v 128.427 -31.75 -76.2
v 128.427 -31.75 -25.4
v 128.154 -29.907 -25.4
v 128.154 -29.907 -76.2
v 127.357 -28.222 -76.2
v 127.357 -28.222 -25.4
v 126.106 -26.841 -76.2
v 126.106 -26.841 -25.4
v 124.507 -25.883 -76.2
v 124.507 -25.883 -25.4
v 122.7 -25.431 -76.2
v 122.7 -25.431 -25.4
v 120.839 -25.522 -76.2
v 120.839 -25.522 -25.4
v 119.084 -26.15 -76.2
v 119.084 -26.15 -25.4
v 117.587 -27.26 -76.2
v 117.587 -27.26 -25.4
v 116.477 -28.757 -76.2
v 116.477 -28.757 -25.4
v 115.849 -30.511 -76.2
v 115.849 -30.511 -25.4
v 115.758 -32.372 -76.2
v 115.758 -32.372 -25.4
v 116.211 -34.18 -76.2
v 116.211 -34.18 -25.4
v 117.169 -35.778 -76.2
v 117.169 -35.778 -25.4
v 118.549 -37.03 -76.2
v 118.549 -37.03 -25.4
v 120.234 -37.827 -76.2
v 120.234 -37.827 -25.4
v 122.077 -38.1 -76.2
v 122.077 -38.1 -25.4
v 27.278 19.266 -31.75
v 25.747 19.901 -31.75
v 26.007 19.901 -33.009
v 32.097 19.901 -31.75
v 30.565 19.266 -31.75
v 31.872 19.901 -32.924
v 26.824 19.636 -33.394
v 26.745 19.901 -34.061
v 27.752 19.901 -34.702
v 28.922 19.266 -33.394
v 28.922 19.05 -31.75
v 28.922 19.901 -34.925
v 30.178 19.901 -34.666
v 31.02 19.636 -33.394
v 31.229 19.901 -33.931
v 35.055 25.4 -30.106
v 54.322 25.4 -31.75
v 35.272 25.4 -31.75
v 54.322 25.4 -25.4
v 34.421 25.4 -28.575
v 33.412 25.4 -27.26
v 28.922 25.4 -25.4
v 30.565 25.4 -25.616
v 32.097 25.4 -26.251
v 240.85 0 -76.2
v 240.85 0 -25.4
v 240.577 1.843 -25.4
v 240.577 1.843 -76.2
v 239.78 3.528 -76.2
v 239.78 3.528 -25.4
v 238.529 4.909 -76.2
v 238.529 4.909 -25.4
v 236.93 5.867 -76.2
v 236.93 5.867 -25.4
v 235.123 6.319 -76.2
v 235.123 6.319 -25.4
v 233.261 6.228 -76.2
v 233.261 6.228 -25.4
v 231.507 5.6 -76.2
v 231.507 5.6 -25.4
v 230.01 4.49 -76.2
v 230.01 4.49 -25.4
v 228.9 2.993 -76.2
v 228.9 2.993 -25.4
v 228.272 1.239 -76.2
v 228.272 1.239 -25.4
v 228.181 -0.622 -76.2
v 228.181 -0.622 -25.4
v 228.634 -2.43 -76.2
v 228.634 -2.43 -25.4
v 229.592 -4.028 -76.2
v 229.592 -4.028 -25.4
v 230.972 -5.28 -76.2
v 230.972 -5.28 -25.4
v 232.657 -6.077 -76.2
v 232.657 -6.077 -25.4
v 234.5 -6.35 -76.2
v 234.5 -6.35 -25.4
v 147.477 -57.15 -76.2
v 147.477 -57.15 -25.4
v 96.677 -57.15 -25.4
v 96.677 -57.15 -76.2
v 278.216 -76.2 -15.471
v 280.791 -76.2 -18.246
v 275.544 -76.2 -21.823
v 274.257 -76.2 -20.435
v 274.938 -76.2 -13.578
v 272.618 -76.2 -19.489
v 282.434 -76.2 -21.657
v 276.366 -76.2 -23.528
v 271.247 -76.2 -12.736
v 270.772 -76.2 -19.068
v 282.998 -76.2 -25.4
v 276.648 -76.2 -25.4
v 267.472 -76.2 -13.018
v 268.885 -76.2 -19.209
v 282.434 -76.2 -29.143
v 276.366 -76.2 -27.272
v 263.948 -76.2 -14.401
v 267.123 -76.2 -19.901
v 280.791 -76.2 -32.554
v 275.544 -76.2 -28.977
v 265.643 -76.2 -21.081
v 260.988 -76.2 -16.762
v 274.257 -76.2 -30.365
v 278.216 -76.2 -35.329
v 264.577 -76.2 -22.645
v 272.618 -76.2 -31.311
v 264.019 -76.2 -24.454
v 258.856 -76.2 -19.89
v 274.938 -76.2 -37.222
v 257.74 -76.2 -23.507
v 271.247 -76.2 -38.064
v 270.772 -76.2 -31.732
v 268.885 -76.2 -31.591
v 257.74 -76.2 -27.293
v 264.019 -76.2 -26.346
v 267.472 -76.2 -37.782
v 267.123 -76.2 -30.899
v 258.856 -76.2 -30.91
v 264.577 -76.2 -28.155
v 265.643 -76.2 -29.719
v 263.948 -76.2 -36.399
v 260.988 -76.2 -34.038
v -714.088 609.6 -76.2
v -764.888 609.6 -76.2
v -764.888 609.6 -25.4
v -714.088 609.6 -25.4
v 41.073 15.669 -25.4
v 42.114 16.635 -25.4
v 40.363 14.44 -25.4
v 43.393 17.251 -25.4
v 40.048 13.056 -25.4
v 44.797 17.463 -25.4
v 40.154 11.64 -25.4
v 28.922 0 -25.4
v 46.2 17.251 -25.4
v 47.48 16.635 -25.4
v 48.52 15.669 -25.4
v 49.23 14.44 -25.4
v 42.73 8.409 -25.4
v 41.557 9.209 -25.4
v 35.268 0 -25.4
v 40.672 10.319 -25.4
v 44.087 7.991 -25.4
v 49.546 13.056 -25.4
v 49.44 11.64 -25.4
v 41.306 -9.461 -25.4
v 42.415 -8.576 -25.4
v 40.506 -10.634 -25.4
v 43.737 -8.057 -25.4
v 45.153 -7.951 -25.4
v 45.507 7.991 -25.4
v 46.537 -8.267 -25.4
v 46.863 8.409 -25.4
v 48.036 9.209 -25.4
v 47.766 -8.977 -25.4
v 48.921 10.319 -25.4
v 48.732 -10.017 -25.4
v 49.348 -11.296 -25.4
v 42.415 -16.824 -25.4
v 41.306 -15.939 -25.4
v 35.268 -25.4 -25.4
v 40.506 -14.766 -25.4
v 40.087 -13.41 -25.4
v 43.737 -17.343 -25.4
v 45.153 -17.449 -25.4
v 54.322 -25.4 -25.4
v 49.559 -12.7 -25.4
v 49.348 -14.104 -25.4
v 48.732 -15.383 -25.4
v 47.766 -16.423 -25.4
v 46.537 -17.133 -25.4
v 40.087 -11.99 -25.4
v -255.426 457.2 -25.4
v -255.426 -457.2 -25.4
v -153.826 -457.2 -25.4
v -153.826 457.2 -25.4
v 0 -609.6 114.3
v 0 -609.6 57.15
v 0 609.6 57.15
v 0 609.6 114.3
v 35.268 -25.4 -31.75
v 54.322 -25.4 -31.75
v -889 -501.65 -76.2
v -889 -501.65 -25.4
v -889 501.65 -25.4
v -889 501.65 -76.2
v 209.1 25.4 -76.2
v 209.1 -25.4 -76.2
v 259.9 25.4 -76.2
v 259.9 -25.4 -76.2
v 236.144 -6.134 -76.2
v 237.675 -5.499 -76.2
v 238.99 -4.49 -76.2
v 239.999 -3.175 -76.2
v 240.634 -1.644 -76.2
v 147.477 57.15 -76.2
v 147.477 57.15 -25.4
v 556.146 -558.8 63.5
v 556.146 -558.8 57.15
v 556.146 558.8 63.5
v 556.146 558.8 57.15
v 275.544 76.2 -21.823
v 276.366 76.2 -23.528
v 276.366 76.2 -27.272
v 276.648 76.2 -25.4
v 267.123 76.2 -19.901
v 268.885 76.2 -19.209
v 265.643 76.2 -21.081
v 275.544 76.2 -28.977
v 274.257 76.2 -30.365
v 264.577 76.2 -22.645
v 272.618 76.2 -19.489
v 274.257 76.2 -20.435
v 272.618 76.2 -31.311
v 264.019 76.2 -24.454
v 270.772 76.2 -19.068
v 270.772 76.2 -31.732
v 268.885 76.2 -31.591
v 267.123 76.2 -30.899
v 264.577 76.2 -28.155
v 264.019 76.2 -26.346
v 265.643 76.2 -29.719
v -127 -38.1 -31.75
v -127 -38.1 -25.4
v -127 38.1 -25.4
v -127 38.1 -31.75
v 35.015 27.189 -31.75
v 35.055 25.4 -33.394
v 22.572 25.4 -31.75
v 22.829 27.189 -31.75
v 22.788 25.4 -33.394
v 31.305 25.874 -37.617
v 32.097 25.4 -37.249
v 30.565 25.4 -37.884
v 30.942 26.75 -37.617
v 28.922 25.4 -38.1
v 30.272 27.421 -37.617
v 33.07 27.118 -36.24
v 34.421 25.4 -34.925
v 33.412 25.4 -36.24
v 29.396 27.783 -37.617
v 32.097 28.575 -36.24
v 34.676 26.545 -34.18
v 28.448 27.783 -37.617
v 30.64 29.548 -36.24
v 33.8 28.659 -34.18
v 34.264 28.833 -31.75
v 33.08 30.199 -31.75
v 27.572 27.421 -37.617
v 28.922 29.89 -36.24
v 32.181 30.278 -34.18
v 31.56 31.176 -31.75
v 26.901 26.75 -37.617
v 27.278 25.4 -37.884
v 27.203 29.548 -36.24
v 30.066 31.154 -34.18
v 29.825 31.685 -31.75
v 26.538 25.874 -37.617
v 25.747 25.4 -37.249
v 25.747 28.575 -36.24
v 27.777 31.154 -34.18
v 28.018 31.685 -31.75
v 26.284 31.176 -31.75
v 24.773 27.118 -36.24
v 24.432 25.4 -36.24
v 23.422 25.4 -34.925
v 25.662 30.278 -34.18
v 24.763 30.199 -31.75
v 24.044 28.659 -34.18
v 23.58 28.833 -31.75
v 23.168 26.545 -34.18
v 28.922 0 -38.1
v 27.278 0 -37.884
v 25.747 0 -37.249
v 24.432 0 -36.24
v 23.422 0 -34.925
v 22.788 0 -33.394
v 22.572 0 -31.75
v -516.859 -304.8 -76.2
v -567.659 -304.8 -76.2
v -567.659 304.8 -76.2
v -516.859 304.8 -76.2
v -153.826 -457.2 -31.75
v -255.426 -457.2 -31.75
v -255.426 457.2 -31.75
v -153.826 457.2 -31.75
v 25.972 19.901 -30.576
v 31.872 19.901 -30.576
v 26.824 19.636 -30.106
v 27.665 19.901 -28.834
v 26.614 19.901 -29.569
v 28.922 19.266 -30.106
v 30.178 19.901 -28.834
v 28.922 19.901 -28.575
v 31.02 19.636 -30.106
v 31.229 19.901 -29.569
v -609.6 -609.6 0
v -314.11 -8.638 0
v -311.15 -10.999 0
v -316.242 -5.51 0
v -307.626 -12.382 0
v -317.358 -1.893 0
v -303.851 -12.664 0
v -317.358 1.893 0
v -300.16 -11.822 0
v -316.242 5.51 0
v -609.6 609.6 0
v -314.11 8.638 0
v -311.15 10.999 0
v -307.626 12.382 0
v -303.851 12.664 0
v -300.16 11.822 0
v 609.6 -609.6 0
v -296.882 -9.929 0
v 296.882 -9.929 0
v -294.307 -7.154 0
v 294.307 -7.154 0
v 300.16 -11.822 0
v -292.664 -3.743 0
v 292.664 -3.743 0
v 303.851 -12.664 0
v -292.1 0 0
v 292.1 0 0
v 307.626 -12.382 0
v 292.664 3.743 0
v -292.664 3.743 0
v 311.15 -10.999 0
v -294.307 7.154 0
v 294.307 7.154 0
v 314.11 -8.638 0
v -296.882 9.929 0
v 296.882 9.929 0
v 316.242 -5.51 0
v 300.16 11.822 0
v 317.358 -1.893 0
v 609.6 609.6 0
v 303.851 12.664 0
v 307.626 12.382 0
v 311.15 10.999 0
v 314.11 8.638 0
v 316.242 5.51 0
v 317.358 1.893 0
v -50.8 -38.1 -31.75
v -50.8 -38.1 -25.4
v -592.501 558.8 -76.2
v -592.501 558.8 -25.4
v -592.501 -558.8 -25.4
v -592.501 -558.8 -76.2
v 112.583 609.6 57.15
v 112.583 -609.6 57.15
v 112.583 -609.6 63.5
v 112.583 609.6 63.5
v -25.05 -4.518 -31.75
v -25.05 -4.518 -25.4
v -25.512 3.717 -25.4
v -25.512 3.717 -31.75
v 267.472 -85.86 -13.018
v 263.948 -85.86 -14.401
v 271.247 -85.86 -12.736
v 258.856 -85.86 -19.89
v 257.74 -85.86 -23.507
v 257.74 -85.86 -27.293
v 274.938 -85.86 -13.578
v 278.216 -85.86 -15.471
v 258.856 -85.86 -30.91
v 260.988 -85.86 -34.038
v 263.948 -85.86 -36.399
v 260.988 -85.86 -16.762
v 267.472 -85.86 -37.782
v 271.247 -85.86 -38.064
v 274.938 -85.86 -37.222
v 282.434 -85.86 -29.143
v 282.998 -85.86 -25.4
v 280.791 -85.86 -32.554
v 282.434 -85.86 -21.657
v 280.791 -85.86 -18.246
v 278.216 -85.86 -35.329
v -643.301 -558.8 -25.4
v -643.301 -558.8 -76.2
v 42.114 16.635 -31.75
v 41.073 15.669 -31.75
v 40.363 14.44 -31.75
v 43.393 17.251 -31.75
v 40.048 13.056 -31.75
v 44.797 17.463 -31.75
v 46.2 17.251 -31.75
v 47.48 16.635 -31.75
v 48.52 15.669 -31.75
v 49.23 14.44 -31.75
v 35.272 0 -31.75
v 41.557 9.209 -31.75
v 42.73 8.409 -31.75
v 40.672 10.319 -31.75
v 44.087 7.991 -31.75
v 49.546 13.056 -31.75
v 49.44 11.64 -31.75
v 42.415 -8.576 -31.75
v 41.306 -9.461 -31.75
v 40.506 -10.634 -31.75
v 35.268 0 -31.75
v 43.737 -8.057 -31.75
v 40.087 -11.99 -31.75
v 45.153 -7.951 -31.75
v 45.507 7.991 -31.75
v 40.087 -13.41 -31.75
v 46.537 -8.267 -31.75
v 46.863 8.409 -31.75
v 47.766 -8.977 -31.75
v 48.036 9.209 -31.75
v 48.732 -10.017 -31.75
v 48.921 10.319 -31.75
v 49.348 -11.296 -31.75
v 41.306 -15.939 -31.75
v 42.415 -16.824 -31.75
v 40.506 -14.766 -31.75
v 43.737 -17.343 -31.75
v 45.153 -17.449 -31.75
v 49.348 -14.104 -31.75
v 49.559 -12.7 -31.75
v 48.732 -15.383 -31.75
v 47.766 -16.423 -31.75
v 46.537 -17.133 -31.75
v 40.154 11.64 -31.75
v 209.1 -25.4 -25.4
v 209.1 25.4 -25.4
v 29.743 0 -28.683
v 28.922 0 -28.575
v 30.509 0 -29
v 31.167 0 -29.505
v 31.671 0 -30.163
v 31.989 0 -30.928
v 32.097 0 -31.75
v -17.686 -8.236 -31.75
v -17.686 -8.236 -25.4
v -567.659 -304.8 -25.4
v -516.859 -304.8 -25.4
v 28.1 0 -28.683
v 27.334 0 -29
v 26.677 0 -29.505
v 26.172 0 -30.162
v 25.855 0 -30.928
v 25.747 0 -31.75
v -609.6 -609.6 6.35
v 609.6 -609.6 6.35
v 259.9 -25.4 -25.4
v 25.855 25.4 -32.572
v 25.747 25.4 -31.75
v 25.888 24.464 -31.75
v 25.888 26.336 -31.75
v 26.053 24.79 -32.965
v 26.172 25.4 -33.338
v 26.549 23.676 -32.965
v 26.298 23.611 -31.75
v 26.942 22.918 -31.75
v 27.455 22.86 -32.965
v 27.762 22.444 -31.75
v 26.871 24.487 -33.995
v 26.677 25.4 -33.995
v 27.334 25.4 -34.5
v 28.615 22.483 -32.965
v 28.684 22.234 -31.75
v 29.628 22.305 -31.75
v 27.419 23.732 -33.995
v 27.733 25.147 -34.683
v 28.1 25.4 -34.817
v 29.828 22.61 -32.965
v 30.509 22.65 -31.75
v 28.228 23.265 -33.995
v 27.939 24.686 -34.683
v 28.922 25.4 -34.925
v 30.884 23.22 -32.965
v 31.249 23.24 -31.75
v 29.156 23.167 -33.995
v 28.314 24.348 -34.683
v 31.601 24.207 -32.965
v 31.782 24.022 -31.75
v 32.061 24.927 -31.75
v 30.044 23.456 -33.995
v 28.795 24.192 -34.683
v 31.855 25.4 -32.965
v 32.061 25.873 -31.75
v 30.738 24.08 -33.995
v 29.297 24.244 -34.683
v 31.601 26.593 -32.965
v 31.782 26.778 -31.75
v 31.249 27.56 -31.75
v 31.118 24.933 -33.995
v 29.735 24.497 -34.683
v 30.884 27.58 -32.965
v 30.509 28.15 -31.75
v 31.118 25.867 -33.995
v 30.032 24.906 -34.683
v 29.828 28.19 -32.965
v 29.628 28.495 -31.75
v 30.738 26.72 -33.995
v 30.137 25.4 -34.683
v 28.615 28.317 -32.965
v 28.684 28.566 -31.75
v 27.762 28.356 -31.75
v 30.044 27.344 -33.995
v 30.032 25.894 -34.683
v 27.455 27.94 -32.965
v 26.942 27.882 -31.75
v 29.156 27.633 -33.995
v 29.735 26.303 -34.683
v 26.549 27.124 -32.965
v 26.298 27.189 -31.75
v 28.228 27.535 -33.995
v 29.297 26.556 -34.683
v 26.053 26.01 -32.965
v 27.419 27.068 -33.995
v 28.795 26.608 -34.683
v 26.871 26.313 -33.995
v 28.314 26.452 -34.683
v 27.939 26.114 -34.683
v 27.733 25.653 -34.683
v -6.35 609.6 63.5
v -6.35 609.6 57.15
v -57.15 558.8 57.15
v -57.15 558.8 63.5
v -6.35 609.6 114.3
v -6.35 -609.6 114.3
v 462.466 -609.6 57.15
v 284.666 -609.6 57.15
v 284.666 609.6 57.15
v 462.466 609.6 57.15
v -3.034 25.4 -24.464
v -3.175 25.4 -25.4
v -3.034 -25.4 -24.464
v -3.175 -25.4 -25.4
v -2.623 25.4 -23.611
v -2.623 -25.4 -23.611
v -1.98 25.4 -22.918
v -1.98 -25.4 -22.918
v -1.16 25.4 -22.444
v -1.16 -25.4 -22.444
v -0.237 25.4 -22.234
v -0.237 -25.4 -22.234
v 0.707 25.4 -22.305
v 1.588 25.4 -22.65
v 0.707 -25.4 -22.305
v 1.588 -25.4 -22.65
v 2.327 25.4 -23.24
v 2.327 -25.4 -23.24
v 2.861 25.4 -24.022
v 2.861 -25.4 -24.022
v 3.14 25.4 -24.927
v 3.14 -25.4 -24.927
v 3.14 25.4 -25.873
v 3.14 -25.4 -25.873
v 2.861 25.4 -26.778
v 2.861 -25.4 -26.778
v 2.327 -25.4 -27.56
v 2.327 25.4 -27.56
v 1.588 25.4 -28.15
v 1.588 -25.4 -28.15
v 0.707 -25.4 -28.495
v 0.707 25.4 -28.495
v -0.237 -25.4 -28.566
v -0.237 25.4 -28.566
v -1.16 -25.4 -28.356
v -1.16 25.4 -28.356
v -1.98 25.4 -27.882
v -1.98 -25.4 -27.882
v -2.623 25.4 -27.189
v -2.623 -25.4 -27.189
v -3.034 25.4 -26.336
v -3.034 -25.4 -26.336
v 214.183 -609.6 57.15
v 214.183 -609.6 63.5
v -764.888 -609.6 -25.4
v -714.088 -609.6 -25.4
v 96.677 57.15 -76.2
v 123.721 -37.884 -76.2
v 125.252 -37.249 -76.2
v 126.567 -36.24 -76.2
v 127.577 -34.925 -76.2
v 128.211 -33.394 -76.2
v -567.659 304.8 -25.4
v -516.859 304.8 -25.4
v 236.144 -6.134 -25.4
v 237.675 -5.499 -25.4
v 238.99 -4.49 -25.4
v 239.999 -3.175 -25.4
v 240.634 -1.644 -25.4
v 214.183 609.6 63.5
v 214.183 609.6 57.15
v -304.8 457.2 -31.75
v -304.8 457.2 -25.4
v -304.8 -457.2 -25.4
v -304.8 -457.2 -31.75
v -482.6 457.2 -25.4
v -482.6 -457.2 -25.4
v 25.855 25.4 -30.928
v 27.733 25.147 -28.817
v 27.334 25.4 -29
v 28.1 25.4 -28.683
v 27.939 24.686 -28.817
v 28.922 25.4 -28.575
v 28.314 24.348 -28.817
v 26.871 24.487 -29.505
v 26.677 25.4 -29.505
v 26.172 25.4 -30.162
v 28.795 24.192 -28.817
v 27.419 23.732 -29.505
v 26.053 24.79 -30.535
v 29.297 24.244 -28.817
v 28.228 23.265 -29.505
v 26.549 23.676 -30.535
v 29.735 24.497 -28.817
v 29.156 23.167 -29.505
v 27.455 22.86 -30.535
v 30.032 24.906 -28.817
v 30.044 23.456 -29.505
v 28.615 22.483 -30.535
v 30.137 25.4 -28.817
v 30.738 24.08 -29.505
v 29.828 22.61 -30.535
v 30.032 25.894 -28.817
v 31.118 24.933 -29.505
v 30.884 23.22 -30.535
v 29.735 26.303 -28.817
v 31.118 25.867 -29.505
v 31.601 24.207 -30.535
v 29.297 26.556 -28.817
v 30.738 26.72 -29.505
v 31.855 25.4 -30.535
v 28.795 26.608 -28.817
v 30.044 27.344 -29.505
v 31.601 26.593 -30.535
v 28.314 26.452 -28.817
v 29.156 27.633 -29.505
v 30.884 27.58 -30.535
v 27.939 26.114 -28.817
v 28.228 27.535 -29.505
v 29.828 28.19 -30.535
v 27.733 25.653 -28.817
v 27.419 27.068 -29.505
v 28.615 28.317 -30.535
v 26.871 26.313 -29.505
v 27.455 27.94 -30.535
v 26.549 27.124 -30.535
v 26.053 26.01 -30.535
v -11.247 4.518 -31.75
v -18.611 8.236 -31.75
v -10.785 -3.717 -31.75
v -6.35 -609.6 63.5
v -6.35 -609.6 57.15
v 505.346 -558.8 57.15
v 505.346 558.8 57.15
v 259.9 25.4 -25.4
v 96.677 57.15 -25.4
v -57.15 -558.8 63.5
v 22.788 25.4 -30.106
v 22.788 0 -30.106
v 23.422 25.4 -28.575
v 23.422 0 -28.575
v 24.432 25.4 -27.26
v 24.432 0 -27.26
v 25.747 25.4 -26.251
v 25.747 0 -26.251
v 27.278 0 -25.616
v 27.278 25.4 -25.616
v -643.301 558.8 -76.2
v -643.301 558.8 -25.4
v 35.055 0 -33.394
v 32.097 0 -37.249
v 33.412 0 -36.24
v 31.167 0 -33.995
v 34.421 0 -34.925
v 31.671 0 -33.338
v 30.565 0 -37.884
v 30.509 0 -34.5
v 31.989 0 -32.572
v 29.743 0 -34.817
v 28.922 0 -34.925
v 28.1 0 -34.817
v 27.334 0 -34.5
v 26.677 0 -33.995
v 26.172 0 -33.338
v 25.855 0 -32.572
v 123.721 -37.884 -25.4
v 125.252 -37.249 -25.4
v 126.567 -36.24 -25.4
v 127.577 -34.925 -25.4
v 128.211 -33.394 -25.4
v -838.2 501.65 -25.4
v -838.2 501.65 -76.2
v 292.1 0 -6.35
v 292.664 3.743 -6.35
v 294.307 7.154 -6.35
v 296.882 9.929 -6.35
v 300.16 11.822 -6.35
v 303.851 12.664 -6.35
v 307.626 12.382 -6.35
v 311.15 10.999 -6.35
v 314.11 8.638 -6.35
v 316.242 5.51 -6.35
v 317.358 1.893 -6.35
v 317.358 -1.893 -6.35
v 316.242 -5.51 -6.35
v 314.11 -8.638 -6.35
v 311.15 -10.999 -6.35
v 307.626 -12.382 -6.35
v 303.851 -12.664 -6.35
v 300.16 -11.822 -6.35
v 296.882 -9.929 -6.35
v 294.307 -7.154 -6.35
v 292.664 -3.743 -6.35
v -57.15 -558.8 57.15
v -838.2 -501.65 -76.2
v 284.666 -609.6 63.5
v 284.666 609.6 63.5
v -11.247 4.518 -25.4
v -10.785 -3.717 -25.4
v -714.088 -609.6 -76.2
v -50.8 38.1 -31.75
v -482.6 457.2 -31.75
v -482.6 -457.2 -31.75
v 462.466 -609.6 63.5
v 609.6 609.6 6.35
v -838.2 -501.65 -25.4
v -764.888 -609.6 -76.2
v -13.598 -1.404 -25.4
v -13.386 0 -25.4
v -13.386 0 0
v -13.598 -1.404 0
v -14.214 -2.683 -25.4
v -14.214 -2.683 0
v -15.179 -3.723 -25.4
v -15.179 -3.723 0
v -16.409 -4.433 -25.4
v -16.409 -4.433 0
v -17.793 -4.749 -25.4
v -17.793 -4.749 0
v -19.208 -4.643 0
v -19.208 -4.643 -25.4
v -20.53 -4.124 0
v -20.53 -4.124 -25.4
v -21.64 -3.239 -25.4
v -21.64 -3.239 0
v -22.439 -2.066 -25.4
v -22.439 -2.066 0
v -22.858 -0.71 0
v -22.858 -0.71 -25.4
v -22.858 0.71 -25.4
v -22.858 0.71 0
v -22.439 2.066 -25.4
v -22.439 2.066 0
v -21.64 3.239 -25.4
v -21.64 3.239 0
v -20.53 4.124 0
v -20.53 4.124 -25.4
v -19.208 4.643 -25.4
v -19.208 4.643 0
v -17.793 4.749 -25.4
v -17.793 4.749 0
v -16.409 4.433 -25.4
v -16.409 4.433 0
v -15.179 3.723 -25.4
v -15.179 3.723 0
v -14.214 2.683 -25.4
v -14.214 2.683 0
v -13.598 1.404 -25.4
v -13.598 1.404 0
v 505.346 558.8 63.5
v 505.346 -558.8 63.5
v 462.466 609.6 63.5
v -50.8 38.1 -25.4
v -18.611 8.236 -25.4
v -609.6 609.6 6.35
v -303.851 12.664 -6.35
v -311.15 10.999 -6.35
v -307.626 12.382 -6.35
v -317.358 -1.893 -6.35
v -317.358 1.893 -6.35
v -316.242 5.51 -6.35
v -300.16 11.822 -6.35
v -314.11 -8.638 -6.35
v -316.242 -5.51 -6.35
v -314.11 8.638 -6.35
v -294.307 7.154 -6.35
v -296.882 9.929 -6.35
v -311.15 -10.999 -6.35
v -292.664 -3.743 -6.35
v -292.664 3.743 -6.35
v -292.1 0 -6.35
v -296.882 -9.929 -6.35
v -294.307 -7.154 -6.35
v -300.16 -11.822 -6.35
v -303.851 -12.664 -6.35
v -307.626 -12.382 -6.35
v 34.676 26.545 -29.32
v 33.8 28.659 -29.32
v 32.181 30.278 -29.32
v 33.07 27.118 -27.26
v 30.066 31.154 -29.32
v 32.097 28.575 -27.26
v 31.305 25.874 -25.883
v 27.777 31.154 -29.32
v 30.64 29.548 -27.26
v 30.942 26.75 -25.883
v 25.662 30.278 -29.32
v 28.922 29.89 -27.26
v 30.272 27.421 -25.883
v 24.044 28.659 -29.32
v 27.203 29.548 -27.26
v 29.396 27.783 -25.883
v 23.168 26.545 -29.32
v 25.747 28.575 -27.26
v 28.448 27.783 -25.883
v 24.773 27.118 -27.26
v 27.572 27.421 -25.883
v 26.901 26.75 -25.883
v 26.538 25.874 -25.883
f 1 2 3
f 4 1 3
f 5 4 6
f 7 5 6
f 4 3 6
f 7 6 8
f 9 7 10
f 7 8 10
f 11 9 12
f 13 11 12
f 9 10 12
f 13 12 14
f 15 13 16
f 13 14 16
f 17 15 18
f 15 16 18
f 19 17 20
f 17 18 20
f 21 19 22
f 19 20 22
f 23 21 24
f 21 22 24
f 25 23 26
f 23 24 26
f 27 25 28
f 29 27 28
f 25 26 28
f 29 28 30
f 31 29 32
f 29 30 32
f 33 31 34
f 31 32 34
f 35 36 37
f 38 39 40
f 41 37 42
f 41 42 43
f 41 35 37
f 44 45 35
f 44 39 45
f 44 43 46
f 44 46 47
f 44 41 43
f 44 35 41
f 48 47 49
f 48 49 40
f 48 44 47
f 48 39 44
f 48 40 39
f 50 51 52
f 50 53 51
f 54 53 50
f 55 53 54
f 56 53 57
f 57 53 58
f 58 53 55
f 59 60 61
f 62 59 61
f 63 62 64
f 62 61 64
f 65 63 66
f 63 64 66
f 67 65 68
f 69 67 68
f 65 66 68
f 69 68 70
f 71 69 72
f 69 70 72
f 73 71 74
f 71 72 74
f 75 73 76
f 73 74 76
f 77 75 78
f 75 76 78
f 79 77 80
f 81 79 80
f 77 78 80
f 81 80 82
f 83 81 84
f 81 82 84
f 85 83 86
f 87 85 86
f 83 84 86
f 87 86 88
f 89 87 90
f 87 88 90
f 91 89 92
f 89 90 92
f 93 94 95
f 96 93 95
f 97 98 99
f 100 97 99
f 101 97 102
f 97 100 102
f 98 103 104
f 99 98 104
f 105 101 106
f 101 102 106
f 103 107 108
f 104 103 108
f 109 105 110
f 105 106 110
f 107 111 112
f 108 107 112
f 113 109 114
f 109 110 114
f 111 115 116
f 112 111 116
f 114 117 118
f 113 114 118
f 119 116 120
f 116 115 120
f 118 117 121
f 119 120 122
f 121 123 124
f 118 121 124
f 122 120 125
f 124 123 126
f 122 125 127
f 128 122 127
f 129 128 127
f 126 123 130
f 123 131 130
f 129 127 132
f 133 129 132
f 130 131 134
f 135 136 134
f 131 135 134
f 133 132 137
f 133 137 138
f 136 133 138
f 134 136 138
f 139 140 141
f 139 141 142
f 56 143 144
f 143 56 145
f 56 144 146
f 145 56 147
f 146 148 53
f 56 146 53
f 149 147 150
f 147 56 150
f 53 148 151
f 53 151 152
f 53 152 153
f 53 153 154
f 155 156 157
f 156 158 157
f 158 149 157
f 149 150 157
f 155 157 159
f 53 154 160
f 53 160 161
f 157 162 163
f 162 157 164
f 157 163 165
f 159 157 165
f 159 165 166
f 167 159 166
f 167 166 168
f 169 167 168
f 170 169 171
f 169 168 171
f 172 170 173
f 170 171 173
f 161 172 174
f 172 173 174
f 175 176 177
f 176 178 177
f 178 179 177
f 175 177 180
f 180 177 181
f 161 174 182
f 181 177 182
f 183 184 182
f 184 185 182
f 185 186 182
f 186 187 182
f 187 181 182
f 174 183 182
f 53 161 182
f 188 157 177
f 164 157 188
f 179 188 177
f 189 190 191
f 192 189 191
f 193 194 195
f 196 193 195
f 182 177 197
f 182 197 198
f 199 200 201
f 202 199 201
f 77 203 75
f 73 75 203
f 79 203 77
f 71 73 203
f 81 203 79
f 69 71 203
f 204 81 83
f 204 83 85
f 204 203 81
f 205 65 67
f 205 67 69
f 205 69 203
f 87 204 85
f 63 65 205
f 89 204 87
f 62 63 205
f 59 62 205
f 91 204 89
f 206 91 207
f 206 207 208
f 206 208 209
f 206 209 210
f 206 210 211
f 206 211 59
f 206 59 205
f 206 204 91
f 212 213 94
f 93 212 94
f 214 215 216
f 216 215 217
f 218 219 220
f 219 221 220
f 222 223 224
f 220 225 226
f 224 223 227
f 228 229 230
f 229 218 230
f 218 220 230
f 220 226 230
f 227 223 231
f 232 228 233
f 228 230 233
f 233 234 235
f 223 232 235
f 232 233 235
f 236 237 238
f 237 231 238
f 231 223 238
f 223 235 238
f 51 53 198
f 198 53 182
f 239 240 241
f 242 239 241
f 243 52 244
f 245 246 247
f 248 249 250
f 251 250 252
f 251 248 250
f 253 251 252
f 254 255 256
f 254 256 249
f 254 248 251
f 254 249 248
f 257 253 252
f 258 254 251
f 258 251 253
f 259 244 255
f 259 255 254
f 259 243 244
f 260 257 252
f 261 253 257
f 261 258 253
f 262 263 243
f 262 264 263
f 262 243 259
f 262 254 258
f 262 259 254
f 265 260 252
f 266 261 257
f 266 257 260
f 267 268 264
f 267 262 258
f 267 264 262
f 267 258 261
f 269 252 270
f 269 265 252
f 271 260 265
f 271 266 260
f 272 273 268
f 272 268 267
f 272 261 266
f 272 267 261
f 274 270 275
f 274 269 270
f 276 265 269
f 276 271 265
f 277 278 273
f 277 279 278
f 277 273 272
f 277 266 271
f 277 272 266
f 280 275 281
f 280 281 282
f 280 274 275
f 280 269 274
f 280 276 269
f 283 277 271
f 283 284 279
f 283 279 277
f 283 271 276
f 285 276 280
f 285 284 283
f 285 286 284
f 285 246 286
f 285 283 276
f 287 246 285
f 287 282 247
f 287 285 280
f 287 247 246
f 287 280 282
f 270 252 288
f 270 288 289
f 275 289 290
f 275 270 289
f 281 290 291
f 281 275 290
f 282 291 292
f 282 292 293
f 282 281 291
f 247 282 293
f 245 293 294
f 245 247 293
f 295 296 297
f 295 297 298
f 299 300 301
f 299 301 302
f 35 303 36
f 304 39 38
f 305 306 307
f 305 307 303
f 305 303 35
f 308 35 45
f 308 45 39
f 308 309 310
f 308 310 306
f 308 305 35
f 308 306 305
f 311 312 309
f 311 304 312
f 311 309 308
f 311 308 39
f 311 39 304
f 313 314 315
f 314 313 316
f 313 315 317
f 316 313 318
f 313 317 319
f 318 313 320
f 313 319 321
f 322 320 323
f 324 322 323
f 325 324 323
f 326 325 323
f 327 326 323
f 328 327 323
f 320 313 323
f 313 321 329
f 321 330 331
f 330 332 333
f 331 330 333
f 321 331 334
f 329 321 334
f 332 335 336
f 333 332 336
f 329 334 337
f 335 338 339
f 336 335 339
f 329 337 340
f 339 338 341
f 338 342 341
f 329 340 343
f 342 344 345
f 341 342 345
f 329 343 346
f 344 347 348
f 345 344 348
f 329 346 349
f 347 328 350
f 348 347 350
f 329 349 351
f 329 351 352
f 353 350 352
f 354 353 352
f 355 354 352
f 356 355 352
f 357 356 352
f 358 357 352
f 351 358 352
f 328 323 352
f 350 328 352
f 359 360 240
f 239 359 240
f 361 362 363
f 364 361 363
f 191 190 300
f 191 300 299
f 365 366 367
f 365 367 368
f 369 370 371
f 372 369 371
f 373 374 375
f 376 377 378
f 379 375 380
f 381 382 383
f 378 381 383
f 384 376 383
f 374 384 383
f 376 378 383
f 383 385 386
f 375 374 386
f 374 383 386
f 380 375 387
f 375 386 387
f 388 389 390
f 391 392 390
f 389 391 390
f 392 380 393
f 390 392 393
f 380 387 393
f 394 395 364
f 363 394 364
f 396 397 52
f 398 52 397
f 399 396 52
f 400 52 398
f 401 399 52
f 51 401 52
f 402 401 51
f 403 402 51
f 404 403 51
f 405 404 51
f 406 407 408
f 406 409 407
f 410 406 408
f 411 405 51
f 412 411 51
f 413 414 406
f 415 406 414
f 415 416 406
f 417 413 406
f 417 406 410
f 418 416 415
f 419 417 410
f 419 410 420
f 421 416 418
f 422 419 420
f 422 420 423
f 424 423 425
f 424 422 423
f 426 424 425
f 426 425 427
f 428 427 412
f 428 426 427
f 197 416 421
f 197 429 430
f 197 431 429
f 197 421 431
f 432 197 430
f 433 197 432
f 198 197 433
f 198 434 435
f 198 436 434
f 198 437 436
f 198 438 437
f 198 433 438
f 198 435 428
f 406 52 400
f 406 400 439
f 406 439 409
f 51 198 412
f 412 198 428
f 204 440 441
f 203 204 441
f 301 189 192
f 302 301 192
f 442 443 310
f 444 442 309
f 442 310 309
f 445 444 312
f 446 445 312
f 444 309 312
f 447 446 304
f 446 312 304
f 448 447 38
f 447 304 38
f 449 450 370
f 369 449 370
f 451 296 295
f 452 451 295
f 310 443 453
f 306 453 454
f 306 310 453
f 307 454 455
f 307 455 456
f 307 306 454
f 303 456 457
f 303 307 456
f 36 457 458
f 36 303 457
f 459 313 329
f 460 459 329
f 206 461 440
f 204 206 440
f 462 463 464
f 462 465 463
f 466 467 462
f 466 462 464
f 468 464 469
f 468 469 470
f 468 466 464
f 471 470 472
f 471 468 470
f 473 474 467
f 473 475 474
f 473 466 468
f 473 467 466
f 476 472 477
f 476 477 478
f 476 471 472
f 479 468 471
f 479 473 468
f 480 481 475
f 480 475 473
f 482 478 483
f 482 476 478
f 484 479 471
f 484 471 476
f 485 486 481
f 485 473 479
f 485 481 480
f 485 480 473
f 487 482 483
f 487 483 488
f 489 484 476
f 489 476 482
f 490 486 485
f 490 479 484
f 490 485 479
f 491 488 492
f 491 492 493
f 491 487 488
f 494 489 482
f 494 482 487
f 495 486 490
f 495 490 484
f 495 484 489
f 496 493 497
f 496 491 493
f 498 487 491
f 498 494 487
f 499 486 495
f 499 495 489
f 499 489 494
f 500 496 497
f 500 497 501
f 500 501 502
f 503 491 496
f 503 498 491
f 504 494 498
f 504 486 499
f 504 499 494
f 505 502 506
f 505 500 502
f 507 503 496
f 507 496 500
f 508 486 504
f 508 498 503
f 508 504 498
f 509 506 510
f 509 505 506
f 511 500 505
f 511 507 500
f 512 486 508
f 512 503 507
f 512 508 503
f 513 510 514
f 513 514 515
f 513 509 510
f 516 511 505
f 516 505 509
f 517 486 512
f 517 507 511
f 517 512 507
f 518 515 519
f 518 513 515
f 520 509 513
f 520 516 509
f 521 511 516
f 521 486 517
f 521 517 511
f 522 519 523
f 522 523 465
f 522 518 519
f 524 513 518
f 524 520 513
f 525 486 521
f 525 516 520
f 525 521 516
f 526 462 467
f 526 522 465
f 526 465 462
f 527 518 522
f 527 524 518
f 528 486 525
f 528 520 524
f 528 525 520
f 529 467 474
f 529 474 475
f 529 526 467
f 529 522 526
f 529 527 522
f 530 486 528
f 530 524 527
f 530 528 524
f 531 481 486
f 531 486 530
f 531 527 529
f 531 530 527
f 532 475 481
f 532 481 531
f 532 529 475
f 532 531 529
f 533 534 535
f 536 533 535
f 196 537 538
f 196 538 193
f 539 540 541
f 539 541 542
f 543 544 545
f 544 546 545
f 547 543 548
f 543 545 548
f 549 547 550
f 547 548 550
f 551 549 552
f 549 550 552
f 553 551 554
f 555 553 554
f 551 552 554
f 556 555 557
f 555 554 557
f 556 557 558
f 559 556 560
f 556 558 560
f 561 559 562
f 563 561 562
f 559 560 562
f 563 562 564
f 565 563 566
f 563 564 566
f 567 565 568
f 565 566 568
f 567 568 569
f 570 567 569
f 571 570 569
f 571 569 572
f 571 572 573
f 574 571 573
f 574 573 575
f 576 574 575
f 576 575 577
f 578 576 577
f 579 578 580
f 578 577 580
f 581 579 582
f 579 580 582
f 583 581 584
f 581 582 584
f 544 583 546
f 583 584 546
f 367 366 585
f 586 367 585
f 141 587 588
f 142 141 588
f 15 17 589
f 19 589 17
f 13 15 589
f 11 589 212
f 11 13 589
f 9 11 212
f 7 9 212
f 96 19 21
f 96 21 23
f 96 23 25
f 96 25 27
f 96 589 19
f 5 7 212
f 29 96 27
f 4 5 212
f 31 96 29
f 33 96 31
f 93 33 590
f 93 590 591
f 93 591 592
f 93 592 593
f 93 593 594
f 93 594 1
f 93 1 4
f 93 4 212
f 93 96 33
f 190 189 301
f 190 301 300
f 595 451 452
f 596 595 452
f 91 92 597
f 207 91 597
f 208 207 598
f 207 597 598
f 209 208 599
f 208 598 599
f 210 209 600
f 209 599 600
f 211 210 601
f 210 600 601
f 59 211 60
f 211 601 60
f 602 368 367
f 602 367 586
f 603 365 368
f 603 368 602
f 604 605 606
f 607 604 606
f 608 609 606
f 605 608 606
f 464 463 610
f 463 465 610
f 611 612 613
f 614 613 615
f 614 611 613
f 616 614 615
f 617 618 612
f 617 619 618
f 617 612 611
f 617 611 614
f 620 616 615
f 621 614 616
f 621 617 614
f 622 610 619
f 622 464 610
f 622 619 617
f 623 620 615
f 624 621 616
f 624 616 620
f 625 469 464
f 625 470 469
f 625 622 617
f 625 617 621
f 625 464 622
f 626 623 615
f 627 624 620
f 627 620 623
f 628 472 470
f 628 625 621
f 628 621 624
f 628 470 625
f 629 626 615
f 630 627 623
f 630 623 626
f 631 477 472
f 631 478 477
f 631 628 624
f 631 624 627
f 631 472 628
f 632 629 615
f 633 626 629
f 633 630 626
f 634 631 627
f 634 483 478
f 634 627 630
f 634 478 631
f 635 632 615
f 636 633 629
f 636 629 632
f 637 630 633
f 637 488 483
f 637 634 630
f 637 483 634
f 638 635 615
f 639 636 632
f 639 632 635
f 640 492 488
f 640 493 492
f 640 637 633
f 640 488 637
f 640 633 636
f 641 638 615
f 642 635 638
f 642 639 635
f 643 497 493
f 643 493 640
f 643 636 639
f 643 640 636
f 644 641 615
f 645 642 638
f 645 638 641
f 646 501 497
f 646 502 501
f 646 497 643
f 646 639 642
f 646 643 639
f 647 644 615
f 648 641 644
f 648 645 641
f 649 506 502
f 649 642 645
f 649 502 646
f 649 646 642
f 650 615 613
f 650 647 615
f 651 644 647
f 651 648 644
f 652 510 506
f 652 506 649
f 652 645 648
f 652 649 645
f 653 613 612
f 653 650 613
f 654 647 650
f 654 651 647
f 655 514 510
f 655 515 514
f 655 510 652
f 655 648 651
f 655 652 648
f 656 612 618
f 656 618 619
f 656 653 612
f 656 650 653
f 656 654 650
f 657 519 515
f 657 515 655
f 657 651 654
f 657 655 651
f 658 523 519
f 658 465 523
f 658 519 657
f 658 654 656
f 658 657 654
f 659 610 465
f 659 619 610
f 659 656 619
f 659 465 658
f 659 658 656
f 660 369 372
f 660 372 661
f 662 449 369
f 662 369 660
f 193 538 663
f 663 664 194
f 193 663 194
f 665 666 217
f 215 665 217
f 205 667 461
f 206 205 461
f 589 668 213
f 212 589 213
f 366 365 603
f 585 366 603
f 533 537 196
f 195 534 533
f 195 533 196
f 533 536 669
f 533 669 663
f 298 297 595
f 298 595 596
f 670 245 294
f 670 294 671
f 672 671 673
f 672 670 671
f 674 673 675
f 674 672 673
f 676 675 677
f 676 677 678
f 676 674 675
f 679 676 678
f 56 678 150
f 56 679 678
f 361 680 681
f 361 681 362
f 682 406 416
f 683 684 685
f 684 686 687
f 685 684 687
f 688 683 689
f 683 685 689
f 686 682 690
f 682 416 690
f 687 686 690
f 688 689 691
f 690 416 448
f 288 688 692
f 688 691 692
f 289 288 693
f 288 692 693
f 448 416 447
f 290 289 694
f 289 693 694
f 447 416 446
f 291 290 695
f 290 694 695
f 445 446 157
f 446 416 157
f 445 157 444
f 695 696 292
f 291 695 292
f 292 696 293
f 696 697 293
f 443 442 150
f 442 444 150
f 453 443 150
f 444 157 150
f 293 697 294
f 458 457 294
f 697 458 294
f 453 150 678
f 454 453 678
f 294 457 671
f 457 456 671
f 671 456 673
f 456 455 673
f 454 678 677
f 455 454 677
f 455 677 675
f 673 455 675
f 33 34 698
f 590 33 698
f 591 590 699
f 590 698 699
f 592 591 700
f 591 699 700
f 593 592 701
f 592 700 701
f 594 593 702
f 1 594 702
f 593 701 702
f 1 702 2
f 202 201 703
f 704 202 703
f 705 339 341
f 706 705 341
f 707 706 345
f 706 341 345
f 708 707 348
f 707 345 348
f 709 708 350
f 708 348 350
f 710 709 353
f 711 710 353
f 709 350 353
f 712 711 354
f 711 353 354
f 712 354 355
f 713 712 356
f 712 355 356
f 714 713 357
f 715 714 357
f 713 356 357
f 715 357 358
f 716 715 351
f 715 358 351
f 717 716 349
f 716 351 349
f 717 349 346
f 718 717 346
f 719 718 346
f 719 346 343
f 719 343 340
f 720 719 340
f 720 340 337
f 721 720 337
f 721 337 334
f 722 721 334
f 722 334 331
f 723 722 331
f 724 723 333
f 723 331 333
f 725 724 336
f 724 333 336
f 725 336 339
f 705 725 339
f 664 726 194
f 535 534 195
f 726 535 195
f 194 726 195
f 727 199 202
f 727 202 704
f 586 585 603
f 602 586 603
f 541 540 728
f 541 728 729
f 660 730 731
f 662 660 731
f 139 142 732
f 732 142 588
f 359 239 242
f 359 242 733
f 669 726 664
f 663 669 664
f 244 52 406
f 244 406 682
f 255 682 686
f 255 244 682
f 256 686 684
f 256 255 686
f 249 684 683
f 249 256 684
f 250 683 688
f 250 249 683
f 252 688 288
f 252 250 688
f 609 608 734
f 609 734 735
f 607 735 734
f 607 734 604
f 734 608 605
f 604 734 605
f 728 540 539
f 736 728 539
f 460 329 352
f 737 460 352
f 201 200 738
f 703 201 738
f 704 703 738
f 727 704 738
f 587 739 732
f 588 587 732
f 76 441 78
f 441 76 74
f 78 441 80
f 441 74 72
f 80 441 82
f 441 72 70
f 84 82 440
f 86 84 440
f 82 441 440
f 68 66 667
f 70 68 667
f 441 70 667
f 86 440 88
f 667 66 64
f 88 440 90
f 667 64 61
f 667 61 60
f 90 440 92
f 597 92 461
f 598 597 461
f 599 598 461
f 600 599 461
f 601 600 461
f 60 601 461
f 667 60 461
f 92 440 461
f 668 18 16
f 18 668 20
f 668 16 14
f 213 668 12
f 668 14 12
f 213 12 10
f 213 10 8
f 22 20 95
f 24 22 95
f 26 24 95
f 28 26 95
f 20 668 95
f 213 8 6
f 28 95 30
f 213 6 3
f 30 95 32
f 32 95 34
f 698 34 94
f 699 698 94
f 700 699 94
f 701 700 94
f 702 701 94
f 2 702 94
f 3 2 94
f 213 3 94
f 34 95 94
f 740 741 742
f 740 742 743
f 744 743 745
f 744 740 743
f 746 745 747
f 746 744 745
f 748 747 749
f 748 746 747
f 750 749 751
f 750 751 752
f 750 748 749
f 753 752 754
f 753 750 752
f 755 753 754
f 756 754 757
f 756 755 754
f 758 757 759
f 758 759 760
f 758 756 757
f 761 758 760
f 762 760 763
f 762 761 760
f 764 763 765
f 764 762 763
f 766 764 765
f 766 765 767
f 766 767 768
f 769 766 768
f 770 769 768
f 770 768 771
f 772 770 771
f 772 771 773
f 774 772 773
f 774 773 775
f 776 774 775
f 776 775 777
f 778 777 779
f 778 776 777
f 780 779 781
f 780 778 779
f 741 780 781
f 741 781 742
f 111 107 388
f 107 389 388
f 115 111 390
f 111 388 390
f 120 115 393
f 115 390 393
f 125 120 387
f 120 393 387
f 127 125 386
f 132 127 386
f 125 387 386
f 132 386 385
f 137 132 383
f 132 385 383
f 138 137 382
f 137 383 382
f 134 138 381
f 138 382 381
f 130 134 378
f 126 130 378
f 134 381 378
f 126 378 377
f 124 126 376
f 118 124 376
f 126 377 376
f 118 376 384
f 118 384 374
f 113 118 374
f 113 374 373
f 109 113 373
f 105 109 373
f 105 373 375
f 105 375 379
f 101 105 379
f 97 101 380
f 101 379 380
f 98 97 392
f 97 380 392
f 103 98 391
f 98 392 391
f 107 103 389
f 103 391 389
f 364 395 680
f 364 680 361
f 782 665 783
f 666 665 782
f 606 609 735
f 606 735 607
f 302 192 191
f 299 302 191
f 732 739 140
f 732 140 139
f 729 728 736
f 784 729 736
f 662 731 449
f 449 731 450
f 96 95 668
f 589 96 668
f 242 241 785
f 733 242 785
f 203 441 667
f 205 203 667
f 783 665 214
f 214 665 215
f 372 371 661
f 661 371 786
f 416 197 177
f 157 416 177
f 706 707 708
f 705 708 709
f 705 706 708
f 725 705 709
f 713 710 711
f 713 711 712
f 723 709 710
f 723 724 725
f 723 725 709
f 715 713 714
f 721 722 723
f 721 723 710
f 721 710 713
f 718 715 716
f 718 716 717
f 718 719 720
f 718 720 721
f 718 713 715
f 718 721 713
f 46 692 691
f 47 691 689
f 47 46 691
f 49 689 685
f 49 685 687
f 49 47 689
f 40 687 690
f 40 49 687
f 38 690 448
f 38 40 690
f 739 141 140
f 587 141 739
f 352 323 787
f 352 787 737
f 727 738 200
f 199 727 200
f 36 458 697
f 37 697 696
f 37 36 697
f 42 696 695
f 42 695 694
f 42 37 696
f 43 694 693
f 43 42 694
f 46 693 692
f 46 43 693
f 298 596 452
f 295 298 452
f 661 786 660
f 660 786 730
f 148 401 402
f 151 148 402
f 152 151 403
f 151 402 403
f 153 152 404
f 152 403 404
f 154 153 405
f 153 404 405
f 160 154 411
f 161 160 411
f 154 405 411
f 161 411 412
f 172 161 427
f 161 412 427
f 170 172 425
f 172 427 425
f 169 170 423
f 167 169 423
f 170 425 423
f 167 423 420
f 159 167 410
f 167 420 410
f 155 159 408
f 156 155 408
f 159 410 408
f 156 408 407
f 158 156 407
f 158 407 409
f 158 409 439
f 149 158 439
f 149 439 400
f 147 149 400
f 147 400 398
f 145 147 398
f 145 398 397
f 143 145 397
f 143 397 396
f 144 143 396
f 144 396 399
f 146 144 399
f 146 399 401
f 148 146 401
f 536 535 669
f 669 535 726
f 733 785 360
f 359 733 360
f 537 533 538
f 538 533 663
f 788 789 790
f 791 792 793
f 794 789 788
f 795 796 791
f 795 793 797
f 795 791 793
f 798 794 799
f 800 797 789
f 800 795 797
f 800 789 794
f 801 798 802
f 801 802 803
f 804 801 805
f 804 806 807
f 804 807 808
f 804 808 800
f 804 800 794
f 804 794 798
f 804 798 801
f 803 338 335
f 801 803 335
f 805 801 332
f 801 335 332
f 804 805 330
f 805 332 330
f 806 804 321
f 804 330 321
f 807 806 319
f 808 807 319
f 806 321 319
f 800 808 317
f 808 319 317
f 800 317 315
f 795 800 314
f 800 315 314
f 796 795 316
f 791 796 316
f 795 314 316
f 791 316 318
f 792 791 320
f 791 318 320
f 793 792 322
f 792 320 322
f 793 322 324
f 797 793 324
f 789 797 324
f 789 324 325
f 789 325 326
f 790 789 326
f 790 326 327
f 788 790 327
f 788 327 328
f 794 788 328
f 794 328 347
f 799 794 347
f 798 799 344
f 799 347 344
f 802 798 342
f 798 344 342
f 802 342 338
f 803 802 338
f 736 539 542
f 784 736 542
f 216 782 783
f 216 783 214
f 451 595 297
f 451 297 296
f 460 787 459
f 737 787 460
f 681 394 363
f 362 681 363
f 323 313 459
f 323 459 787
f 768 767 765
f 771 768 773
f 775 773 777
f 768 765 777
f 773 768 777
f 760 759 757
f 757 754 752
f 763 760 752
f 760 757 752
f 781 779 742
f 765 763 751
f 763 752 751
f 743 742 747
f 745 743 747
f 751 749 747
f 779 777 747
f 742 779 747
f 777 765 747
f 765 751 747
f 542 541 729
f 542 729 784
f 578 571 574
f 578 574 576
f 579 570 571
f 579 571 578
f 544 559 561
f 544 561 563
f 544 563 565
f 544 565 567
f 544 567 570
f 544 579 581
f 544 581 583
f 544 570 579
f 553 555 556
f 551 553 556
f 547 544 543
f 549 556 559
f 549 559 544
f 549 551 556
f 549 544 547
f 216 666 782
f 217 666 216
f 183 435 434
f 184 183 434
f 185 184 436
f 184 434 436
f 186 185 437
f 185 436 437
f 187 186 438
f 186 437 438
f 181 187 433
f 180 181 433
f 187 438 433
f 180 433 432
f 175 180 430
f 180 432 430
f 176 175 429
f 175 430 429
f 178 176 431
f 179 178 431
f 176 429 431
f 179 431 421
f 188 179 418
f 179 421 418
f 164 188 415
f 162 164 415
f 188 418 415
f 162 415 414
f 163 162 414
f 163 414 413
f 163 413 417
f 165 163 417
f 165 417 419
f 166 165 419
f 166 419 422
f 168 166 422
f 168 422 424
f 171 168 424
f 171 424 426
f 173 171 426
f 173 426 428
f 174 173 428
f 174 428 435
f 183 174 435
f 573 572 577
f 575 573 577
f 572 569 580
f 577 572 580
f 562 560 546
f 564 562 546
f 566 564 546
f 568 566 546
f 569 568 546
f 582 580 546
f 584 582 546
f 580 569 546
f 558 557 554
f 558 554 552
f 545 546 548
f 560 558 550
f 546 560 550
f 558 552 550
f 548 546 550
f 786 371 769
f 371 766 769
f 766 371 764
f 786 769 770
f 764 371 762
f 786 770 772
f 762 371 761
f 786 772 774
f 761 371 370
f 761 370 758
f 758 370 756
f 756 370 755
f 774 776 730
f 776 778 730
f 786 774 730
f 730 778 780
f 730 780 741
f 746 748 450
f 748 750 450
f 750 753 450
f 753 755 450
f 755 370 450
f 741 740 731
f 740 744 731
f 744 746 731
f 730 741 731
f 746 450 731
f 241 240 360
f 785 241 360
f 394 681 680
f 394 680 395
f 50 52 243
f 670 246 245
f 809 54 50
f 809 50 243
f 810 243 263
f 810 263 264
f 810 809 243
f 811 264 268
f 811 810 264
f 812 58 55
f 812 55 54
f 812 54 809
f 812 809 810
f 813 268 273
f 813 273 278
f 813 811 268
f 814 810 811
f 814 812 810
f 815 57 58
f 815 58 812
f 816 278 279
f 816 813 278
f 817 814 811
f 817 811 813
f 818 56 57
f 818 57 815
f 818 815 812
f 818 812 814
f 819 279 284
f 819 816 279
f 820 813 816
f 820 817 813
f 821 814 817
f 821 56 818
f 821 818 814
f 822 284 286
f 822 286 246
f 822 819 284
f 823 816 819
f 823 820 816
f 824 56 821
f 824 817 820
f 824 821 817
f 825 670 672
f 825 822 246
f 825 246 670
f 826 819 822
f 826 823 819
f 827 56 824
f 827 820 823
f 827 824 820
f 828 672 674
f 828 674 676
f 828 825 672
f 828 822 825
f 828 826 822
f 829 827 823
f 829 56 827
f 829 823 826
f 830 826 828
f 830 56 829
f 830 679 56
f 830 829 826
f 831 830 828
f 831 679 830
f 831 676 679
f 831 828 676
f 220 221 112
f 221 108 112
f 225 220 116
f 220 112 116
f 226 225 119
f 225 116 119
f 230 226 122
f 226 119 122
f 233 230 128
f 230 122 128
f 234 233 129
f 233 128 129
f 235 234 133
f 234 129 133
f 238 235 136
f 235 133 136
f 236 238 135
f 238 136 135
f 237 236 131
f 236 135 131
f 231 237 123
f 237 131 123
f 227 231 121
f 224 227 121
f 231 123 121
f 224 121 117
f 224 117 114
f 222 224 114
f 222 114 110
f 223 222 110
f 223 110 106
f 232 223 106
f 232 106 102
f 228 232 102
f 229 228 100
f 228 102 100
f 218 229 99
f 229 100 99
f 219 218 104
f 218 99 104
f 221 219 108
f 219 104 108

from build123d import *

# Parameters (mm, degrees)
F0_W      = 1219.2
F0_H      = 1219.2
F1_DEPTH  = 6.35
F3_W      = 177.8
F3_H      = 914.4
F4_DEPTH  = 6.35
F5_W      = 101.6
F5_H      = 914.4
F6_DEPTH  = 6.35
F7_R      = 12.7
F8_DEPTH  = 6.35
F9_W      = 50.8
F9_H      = 609.6
F10_DEPTH = 50.8
F11_W     = 50.8
F11_H     = 1219.2
F12_DEPTH = 50.8
F13_W     = 50.8
F13_H     = 1117.6
F14_DEPTH = 50.8
F15_W     = 25.4
F15_H     = 50.8
F16_DEPTH = 6.35
F18_DEPTH = 25.4
F19_DEPTH = 50.8
F22_DEPTH = 25.4
F23_R     = 4.7625
F24_DEPTH = 25.4
F25_W     = 3.175
F25_H     = 50.8
F25_R     = 4.7625
F27_DEPTH = 25.4
F28_DEPTH = 6.35
F30_DEPTH = 50.8
F32_DEPTH = 6.35
F34_DEPTH = 50.8
F36_DEPTH = 50.8
F35_W     = 6.35
F35_H     = 152.4
F39_W     = 6.35
F39_H     = 609.6
F40_DEPTH = 6.35
F41_DEPTH = 57.15
F42_W     = 177.8
F42_H     = 1219.2
F43_DEPTH = 6.35
F42_W_2   = 101.6
F42_W_3   = 50.8
F42_H_2   = 1117.6


with BuildPart() as f1:
    # F0 (on Top) → F1 (new body)
    with BuildSketch(Plane.XY):
        Rectangle(F0_W, F0_H)
    extrude(amount=F1_DEPTH)

    # F7 (on face) → F8 (join)
    with BuildSketch(Plane(origin=(0, 0, 0), x_dir=(1, 0, 0), z_dir=(0, 0, -1))):
        with BuildLine():
            ThreePointArc((317.5, 0), (304.8, 12.7), (292.1, 0))
            ThreePointArc((292.1, 0), (304.8, -12.7), (317.5, 0))
        make_face()
        with Locations((-304.8, 0)):
            Circle(F7_R)
    extrude(amount=F8_DEPTH)


with BuildPart() as f4:
    # F3 (on offset) → F4 (new body)
    with BuildSketch(Plane(origin=(0, 0, -25.4), x_dir=(1, 0, 0), z_dir=(0, 0, -1))):
        with Locations((-393.7, 0)):
            Rectangle(F3_W, F3_H)
    extrude(amount=F4_DEPTH)


with BuildPart() as f6:
    # F5 (on offset) → F6 (new body)
    with BuildSketch(Plane(origin=(0, 0, -25.4), x_dir=(1, 0, 0), z_dir=(0, 0, -1))):
        with Locations((-204.6257775556, 0)):
            Rectangle(F5_W, F5_H)
    extrude(amount=F6_DEPTH)


with BuildPart() as f10:
    # F9 (on offset) → F10 (new body)
    with BuildSketch(Plane(origin=(0, 0, -25.4), x_dir=(1, 0, 0), z_dir=(0, 0, -1))):
        with Locations((-542.2588756007, 0)):
            Rectangle(F9_W, F9_H)
    extrude(amount=F10_DEPTH)


with BuildPart() as f12:
    # F11 (on offset) → F12 (new body)
    with BuildSketch(Plane(origin=(0, 0, -25.4), x_dir=(1, 0, 0), z_dir=(0, 0, -1))):
        with Locations((-739.4879607756, 0)):
            Rectangle(F11_W, F11_H)
    extrude(amount=F12_DEPTH)


with BuildPart() as f14:
    # F13 (on offset) → F14 (new body)
    with BuildSketch(Plane(origin=(0, 0, -25.4), x_dir=(1, 0, 0), z_dir=(0, 0, -1))):
        with Locations((-617.9012233273, 0)):
            Rectangle(F13_W, F13_H)
    extrude(amount=F14_DEPTH)


with BuildPart() as f16:
    # F15 (on offset) → F16 (new body)
    with BuildSketch(Plane(origin=(0, 0, -25.4), x_dir=(1, 0, 0), z_dir=(0, 0, -1))):
        with Locations((41.6217231725, 0)):
            Rectangle(F15_W, F15_H)
    extrude(amount=F16_DEPTH)

    # F17 (on face) → F18 (join)
    with BuildSketch(Plane(origin=(0, 25.4, 0), x_dir=(-1, 0, 0), z_dir=(0, 1, 0))):
        with BuildLine():
            ThreePointArc((-28.9217231725, -38.1), (-24.4315951119, -36.2401280605), (-22.5717231725, -31.75))
            ThreePointArc((-22.5717231725, -31.75), (-24.4315951119, -27.2598719395), (-28.9217231725, -25.4))
            Line((-28.9217231725, -25.4), (-28.9217231725, -28.575))
            ThreePointArc((-28.9217231725, -28.575), (-26.6766591422, -29.5049359697), (-25.7467231725, -31.75))
            ThreePointArc((-25.7467231725, -31.75), (-26.6766591422, -33.9950640303), (-28.9217231725, -34.925))
            Line((-28.9217231725, -34.925), (-28.9217231725, -38.1))
        make_face()
        with BuildLine():
            Line((-28.9217231725, -28.575), (-28.9217231725, -25.4))
            ThreePointArc((-28.9217231725, -25.4), (-35.2717231725, -31.75), (-28.9217231725, -38.1))
            Line((-28.9217231725, -38.1), (-28.9217231725, -34.925))
            ThreePointArc((-28.9217231725, -34.925), (-32.0967231725, -31.75), (-28.9217231725, -28.575))
        make_face()
    extrude(amount=-F18_DEPTH)

    # F17 (on face) → F19 (cut)
    with BuildSketch(Plane(origin=(0, 25.4, 0), x_dir=(-1, 0, 0), z_dir=(0, 1, 0))):
        with BuildLine():
            ThreePointArc((-25.7467231725, -31.75), (-26.6766591422, -29.5049359697), (-28.9217231725, -28.575))
            Line((-28.9217231725, -28.575), (-28.9217231725, -31.75))
            Line((-28.9217231725, -31.75), (-28.9217231725, -34.925))
            ThreePointArc((-28.9217231725, -34.925), (-26.6766591422, -33.9950640303), (-25.7467231725, -31.75))
        make_face()
        with BuildLine():
            ThreePointArc((-32.0967231725, -31.75), (-31.1667872027, -33.9950640303), (-28.9217231725, -34.925))
            Line((-28.9217231725, -34.925), (-28.9217231725, -31.75))
            Line((-28.9217231725, -31.75), (-32.0967231725, -31.75))
        make_face()
        with BuildLine():
            Line((-28.9217231725, -31.75), (-28.9217231725, -28.575))
            ThreePointArc((-28.9217231725, -28.575), (-31.1667872027, -29.5049359697), (-32.0967231725, -31.75))
            Line((-32.0967231725, -31.75), (-28.9217231725, -31.75))
        make_face()
    extrude(amount=-F19_DEPTH, mode=Mode.SUBTRACT)

    # F17 (on face) → F20 (revolve)
    with BuildSketch(Plane(origin=(0, 25.4, 0), x_dir=(-1, 0, 0), z_dir=(0, 1, 0))):
        with BuildLine():
            ThreePointArc((-28.9217231725, -38.1), (-24.4315951119, -36.2401280605), (-22.5717231725, -31.75))
            ThreePointArc((-22.5717231725, -31.75), (-24.4315951119, -27.2598719395), (-28.9217231725, -25.4))
            Line((-28.9217231725, -25.4), (-28.9217231725, -28.575))
            ThreePointArc((-28.9217231725, -28.575), (-26.6766591422, -29.5049359697), (-25.7467231725, -31.75))
            ThreePointArc((-25.7467231725, -31.75), (-26.6766591422, -33.9950640303), (-28.9217231725, -34.925))
            Line((-28.9217231725, -34.925), (-28.9217231725, -38.1))
        make_face()
    revolve(axis=Axis((28.9217231725, 25.4, -31.75), (0, 0, 1)))

    # F21 (on face) → F22 (cut)
    with BuildSketch(Plane.XZ.offset(25.4)):
        Polygon((28.9217231725, -31.75), (31.9659225643, -31.75), (35.2679225643, -31.75), (35.2679225643, -25.4), (28.9217231725, -25.4), align=None)
    extrude(amount=-F22_DEPTH, mode=Mode.SUBTRACT)

    # F23 (on face) → F24 (cut)
    with BuildSketch(Plane(origin=(0, 0, -31.75), x_dir=(1, 0, 0), z_dir=(0, 0, -1))):
        with Locations((44.7967231725, 12.7)):
            Circle(F23_R)
        with BuildLine():
            ThreePointArc((49.5592231725, -12.7), (41.4291271271, -9.3324039546), (44.7967231725, -17.4625))
            ThreePointArc((44.7967231725, -17.4625), (48.1643192179, -16.0675960454), (49.5592231725, -12.7))
        make_face()
    extrude(amount=-F24_DEPTH, mode=Mode.SUBTRACT)


with BuildPart() as f26:
    # F25 (on offset) → F26 (revolve)
    with BuildSketch(Plane(origin=(0, 0, -25.4), x_dir=(1, 0, 0), z_dir=(0, 0, -1))):
        with Locations((-1.5875, 0)):
            Rectangle(F25_W, F25_H)
    revolve(axis=Axis((0, 0, -25.4), (0, 1, 0)))


with BuildPart() as f27:
    # F25 (on offset) → F27 (new body)
    with BuildSketch(Plane(origin=(0, 0, -25.4), x_dir=(1, 0, 0), z_dir=(0, 0, -1))):
        with Locations((-18.1485898793, 0)):
            Circle(F25_R)
    extrude(amount=-F27_DEPTH)

    # F25 (on offset) → F28 (join)
    with BuildSketch(Plane(origin=(0, 0, -25.4), x_dir=(1, 0, 0), z_dir=(0, 0, -1))):
        Polygon((-18.6110836574, -8.235916358), (-11.2473239789, -4.5184895399), (-10.7848302008, 3.7174268181), (-17.6860961012, 8.235916358), (-25.0498557797, 4.5184895399), (-25.5123495578, -3.7174268181), align=None)
        with Locations((-18.1485898793, 0)):
            Circle(F25_R, mode=Mode.SUBTRACT)
        with Locations((-18.1485898793, 0)):
            Circle(F25_R)
    extrude(amount=F28_DEPTH)


with BuildPart() as f30:
    # F29 (on offset) → F30 (new body)
    with BuildSketch(Plane(origin=(0, 0, -25.4), x_dir=(1, 0, 0), z_dir=(0, 0, -1))):
        Polygon((-889, 501.65), (-889, -501.65), (-838.2, -501.65), (-838.2, 0), (-838.2, 501.65), align=None)
    extrude(amount=F30_DEPTH)


with BuildPart() as f32:
    # F31 (on offset) → F32 (new body)
    with BuildSketch(Plane(origin=(0, 0, -25.4), x_dir=(1, 0, 0), z_dir=(0, 0, -1))):
        Polygon((-127, 38.1), (-127, -38.1), (-50.8, -38.1), (-50.8, 0), (-50.8, 38.1), align=None)
    extrude(amount=F32_DEPTH)


with BuildPart() as f34:
    # F33 (on offset) → F34 (new body)
    with BuildSketch(Plane(origin=(0, 0, -25.4), x_dir=(1, 0, 0), z_dir=(0, 0, -1))):
        Polygon((96.6773392951, -57.15), (147.4773392951, -57.15), (147.4773392951, 57.15), (122.0773392951, 57.15), (96.6773392951, 57.15), align=None)
        with BuildLine():
            ThreePointArc((128.4273392951, 31.75), (117.5872112345, 27.2598719395), (122.0773392951, 38.1))
            ThreePointArc((122.0773392951, 38.1), (126.5674673556, 36.2401280605), (128.4273392951, 31.75))
        make_face(mode=Mode.SUBTRACT)
    extrude(amount=F34_DEPTH)


with BuildPart() as f36:
    # F35 (on offset) → F36 (new body)
    with BuildSketch(Plane(origin=(0, 0, -25.4), x_dir=(1, 0, 0), z_dir=(0, 0, -1))):
        Polygon((209.1001823967, -25.4), (259.9001823967, -25.4), (259.9001823967, 25.4), (234.5001823967, 25.4), (209.1001823967, 25.4), align=None)
        with BuildLine():
            ThreePointArc((240.8501823967, 0), (230.0100543362, -4.4901280605), (234.5001823967, 6.35))
            ThreePointArc((234.5001823967, 6.35), (238.9903104573, 4.4901280605), (240.8501823967, 0))
        make_face(mode=Mode.SUBTRACT)
    extrude(amount=F36_DEPTH)


with BuildPart() as f37:
    # F35 (on offset) → F37 (revolve)
    with BuildSketch(Plane(origin=(0, 0, -25.4), x_dir=(1, 0, 0), z_dir=(0, 0, -1))):
        with Locations((273.4728253365, 0)):
            Rectangle(F35_W, F35_H)
        Polygon((270.2978253365, 76.2), (276.6478253365, 76.2), (282.9978253365, 76.2), (282.9978253365, 85.8596041799), (270.2978253365, 85.8596041799), align=None)
    revolve(axis=Axis((270.2978253365, 0, -25.4), (0, 1, 0)))


with BuildPart() as f40:
    # F39 (on offset) → F40 (new body)
    with BuildSketch(Plane.XY.offset(57.15)):
        with Locations((-3.175, 304.8)):
            Rectangle(F39_W, F39_H)
        with Locations((-3.175, -304.8)):
            Rectangle(F39_W, F39_H)
        Polygon((-6.35, -609.6), (-6.35, 0), (-57.15, 0), (-57.15, -558.8), align=None)
        Polygon((-57.15, 0), (-6.35, 0), (-6.35, 609.6), (-57.15, 558.8), align=None)
    extrude(amount=F40_DEPTH)

    # F39 (on offset) → F41 (join)
    with BuildSketch(Plane.XY.offset(57.15)):
        with Locations((-3.175, 304.8)):
            Rectangle(F39_W, F39_H)
        with Locations((-3.175, -304.8)):
            Rectangle(F39_W, F39_H)
    extrude(amount=F41_DEPTH)


with BuildPart() as f43:
    # F42 (on offset) → F43 (new body)
    with BuildSketch(Plane.XY.offset(57.15)):
        with Locations((373.566137178, 0)):
            Rectangle(F42_W, F42_H)
    extrude(amount=F43_DEPTH)


with BuildPart() as f43b:
    # F42 (on offset) → F43, piece 2 (new body)
    with BuildSketch(Plane.XY.offset(57.15)):
        with Locations((163.3827835321, 0)):
            Rectangle(F42_W_2, F42_H)
    extrude(amount=F43_DEPTH)


with BuildPart() as f43c:
    # F42 (on offset) → F43, piece 3 (new body)
    with BuildSketch(Plane.XY.offset(57.15)):
        with Locations((530.7464003563, 0)):
            Rectangle(F42_W_3, F42_H_2)
    extrude(amount=F43_DEPTH)


solid = Compound([f1.part, f4.part, f6.part, f10.part, f12.part, f14.part, f16.part, f26.part, f27.part, f30.part, f32.part, f34.part, f36.part, f37.part, f40.part, f43.part, f43b.part, f43c.part])
